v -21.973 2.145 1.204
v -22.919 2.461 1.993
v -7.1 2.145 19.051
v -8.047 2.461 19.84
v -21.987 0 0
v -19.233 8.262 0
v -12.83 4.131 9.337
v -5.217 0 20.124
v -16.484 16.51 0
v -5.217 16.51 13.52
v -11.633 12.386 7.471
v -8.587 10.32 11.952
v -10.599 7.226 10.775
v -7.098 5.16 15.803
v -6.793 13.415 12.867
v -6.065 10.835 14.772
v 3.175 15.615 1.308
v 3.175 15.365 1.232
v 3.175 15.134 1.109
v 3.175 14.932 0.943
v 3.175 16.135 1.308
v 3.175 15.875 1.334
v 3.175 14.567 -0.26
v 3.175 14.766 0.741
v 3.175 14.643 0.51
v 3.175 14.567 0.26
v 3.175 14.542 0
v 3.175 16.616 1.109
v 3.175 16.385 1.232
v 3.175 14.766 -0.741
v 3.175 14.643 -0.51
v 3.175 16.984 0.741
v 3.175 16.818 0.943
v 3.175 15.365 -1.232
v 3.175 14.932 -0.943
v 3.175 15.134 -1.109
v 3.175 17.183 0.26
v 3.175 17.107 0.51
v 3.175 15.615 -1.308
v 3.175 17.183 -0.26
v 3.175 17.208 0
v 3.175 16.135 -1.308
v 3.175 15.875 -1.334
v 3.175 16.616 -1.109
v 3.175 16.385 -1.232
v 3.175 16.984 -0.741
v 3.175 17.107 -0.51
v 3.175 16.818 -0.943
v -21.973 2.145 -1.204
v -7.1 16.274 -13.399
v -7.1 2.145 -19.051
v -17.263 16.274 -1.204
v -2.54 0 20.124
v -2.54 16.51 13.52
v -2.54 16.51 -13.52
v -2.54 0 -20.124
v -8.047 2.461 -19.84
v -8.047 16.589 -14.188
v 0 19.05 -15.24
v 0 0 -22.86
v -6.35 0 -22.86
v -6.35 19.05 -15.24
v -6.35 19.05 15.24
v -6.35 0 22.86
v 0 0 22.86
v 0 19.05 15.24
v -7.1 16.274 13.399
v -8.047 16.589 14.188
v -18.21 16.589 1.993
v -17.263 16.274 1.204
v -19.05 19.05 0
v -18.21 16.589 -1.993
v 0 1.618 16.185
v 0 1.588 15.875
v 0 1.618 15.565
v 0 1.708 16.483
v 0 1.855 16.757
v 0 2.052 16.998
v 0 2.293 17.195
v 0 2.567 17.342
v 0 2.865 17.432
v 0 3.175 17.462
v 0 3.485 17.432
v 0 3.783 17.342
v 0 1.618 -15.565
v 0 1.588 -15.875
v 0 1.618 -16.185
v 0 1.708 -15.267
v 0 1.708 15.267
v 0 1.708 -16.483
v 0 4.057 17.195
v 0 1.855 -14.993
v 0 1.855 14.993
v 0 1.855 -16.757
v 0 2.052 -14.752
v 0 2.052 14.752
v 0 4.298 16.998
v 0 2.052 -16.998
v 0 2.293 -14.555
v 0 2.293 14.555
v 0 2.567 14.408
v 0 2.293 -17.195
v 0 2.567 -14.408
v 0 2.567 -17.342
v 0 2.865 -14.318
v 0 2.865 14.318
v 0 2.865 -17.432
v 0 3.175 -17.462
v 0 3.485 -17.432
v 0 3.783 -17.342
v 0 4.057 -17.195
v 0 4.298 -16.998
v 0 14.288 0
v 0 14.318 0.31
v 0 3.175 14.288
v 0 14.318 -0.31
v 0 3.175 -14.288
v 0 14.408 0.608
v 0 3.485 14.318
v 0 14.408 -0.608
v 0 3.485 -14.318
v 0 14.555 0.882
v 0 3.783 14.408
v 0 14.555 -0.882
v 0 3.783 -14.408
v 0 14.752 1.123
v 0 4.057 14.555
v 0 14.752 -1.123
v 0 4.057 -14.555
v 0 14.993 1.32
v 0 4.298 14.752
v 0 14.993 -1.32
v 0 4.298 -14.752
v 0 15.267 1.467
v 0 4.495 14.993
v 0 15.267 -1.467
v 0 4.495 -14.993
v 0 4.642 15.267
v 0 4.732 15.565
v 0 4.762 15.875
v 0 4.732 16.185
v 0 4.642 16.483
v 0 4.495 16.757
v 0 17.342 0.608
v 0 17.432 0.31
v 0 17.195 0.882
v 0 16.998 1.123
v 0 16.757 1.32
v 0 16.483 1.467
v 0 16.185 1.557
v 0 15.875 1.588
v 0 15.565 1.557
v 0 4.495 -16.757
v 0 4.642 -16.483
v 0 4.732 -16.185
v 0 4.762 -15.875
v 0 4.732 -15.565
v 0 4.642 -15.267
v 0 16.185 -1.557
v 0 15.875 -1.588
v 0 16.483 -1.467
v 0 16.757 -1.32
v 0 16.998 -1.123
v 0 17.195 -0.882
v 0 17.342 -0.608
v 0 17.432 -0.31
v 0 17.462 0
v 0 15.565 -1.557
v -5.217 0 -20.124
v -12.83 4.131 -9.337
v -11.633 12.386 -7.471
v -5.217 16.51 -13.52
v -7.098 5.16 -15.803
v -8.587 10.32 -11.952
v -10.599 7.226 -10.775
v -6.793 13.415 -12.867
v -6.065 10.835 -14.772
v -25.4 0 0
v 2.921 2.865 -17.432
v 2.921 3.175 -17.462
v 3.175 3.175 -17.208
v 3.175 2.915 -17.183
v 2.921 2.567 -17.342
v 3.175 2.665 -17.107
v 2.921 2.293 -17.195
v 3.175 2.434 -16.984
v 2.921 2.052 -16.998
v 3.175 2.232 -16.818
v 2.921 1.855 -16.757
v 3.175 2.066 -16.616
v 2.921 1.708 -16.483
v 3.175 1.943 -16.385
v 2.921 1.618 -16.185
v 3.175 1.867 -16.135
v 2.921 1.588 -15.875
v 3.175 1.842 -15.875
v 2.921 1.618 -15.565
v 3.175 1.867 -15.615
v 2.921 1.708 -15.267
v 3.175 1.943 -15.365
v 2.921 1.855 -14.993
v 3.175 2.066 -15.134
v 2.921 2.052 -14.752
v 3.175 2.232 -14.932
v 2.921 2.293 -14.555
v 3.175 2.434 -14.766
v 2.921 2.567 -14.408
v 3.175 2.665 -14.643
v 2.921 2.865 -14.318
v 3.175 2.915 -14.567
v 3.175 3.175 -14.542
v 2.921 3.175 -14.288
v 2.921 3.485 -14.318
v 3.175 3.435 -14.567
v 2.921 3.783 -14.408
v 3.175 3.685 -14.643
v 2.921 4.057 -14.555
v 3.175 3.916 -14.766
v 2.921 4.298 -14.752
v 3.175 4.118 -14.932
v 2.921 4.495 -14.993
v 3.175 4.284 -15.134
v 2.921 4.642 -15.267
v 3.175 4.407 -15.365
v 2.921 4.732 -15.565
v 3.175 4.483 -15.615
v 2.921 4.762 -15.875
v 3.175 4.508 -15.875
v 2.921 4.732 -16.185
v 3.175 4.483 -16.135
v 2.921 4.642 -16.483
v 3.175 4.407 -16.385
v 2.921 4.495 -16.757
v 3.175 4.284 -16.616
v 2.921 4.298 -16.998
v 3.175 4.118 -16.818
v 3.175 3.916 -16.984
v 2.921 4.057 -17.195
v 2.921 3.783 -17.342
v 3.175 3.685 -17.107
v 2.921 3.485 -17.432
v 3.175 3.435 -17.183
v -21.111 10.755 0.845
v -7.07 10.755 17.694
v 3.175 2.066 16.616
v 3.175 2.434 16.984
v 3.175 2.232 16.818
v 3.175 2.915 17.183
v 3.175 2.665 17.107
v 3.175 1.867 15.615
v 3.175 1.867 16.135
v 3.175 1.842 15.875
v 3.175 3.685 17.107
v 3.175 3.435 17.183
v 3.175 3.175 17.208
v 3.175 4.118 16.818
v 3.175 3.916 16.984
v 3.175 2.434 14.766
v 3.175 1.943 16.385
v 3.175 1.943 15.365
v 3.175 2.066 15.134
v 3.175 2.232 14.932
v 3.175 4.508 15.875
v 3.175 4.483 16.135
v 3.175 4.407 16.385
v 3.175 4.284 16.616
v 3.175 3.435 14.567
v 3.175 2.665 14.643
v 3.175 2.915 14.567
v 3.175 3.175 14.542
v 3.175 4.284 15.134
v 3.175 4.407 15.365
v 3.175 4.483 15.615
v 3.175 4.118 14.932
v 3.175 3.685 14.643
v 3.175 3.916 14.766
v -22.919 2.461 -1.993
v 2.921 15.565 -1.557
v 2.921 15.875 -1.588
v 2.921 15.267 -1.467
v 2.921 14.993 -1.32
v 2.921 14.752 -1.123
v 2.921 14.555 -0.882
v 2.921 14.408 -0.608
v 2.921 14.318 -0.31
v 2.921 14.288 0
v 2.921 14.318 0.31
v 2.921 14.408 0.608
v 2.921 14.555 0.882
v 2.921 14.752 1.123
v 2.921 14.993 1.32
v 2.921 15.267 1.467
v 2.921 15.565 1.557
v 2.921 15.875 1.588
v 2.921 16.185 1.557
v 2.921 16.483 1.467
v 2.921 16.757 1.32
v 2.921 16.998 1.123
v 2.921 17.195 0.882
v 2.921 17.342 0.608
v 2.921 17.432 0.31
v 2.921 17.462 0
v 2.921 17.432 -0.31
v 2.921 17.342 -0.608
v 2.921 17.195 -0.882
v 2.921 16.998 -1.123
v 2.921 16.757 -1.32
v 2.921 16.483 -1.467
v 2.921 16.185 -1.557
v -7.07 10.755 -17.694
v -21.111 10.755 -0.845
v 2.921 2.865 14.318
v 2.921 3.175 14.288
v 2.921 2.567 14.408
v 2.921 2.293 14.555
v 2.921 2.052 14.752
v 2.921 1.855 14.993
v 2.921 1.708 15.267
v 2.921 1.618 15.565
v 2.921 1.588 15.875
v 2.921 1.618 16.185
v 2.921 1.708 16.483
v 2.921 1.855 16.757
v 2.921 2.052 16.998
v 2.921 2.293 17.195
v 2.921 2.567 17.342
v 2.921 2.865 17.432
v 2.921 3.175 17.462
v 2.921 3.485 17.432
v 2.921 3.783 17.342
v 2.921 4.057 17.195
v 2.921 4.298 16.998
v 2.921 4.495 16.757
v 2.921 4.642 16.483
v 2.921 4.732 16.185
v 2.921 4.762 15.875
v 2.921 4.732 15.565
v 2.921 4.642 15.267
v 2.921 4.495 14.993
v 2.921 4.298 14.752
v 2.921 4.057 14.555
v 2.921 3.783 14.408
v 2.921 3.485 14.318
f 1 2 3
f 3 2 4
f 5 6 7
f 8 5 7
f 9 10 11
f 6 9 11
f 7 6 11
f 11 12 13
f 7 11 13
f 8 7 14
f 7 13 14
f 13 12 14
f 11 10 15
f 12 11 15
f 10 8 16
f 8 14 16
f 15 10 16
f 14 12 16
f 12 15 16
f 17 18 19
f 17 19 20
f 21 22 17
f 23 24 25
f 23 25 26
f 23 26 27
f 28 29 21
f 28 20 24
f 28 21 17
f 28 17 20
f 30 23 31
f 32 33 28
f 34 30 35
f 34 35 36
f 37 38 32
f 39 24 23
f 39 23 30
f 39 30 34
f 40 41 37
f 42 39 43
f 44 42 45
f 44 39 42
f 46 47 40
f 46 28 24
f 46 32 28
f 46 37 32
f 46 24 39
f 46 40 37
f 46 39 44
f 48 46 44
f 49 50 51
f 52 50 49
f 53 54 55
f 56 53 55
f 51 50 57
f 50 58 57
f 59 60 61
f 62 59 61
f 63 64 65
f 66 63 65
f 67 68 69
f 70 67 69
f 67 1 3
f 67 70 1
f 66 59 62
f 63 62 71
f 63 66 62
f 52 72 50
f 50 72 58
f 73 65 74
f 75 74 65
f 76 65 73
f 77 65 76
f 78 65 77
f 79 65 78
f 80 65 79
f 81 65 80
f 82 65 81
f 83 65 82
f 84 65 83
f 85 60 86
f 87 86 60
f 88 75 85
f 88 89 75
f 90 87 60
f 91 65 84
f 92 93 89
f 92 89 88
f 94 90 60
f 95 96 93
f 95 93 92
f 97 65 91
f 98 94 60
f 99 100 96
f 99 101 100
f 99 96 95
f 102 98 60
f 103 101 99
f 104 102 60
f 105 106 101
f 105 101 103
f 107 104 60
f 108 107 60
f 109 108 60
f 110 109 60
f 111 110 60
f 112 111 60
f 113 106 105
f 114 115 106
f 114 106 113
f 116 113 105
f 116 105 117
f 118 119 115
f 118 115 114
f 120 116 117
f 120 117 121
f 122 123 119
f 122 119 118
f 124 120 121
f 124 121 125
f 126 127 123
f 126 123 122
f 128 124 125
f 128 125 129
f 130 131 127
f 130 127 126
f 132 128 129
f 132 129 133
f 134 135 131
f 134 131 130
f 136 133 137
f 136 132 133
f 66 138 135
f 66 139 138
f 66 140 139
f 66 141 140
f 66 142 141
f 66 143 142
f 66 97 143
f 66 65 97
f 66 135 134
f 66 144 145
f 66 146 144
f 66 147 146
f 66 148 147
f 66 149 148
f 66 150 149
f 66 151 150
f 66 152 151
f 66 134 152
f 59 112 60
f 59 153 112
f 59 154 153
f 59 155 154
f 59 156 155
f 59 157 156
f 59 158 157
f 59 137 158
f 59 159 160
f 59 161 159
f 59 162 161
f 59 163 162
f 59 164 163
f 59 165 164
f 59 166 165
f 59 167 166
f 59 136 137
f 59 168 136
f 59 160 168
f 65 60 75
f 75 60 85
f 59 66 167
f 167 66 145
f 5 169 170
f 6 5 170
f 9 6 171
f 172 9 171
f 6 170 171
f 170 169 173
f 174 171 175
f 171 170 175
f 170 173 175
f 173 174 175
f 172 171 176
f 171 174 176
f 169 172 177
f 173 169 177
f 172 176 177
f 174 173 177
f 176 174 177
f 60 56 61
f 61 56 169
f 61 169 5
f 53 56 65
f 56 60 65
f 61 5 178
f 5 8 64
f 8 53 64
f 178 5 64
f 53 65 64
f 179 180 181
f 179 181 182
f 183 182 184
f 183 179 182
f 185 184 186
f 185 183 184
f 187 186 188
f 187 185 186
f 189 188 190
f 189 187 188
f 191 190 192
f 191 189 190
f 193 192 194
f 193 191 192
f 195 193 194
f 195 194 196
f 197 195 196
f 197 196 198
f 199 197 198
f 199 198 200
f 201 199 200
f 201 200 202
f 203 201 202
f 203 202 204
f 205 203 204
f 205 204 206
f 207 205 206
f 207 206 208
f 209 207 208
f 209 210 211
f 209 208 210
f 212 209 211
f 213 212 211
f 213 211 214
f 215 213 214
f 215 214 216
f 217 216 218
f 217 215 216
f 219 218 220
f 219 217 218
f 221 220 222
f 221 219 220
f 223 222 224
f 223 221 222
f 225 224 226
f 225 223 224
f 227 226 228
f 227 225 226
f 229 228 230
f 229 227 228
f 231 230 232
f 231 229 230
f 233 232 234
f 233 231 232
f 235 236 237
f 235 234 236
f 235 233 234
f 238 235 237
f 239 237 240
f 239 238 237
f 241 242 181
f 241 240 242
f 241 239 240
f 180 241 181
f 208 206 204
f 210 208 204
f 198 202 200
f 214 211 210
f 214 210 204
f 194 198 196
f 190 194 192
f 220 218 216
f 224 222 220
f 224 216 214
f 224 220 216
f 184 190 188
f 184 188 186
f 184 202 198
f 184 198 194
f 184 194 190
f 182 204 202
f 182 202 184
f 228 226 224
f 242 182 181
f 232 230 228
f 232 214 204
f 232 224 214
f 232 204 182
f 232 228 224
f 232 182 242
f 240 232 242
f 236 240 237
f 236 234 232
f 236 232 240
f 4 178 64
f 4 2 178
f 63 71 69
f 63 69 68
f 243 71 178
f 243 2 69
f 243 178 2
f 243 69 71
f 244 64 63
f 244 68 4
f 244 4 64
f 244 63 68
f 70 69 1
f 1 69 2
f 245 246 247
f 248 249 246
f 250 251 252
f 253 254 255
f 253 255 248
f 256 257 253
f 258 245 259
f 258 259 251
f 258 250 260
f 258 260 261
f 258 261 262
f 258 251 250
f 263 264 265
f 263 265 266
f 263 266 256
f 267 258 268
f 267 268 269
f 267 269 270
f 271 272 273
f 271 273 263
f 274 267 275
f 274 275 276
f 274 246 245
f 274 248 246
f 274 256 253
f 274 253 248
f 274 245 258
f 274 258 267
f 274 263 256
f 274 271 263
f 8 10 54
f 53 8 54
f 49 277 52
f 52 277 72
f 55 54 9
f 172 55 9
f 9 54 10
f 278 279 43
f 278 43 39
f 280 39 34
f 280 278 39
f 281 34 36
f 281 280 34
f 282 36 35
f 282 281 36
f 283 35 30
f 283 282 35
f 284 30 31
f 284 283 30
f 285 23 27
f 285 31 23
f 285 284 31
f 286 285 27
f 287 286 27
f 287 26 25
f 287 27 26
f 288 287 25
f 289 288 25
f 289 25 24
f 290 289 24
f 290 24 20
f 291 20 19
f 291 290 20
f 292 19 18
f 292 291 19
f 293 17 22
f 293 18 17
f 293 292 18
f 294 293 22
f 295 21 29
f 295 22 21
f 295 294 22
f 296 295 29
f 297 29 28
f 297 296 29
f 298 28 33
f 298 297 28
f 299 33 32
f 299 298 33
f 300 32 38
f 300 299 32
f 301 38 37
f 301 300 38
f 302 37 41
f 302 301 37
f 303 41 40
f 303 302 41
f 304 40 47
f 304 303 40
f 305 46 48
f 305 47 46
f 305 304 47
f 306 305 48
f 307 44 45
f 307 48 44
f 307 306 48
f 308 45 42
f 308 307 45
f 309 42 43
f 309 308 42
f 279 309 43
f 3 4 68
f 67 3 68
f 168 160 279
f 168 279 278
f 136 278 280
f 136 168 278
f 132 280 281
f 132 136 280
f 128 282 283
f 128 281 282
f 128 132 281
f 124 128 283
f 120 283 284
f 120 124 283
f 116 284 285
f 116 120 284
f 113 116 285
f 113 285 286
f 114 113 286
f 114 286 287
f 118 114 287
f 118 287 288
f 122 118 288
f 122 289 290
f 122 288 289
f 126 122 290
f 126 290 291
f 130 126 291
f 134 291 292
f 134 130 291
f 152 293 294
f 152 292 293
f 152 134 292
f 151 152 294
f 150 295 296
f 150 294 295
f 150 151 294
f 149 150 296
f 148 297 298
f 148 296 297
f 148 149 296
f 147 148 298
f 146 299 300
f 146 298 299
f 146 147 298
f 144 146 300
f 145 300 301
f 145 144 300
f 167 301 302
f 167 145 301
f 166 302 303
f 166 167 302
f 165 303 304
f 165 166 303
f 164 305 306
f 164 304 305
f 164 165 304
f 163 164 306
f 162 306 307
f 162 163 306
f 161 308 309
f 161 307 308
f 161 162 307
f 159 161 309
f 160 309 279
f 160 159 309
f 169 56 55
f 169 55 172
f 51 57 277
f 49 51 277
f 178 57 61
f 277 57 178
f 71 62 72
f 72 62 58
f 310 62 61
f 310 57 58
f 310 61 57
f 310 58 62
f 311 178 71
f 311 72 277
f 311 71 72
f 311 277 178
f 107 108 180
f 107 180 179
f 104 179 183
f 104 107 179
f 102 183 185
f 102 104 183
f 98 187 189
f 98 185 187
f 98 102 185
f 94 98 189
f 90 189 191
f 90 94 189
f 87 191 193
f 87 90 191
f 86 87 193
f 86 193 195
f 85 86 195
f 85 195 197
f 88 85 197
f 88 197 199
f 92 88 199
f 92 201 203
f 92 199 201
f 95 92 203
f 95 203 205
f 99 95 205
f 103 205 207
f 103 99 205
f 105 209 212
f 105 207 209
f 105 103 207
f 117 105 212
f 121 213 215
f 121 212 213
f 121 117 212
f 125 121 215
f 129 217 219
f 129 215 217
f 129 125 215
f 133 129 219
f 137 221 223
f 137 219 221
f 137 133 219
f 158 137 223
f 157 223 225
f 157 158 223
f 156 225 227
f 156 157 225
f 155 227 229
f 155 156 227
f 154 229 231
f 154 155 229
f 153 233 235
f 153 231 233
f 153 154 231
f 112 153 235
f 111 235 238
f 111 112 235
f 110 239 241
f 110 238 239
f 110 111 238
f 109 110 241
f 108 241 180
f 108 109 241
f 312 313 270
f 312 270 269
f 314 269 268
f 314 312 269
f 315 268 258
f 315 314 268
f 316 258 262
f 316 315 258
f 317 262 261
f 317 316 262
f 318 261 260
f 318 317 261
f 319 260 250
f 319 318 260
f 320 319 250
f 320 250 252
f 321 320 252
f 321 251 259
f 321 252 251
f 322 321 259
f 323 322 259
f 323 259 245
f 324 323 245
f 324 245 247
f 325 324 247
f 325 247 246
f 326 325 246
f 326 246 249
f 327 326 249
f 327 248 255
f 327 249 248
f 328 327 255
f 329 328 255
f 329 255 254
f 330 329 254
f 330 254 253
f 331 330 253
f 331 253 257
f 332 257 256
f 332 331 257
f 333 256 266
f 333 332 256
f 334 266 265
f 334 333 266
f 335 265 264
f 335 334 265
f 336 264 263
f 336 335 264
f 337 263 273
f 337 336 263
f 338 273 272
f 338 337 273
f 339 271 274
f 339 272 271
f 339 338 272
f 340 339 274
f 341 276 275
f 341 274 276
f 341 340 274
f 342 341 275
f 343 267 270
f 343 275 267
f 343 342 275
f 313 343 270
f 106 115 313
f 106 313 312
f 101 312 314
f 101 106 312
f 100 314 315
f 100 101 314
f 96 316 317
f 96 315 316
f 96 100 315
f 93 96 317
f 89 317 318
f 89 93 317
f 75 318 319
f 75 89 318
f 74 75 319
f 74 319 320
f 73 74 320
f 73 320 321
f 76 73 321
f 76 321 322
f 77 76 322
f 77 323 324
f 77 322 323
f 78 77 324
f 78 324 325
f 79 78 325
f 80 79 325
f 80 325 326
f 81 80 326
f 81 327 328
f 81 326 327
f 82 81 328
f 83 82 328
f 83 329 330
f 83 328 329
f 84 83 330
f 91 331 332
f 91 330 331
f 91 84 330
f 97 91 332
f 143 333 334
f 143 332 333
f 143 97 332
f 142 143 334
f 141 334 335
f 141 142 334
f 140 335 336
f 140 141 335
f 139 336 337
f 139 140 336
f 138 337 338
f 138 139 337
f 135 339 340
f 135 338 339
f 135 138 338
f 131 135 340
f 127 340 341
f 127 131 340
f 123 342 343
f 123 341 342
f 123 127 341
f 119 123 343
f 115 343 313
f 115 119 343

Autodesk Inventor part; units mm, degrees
ref_plane "YZ Plane" through (0, 0, 0) normal (1, 0, 0) x (0, 1, 0)
ref_plane "XY Plane" through (0, 0, 0) normal (0, 0, 1) x (1, 0, 0)
sketch "Bottom sketch" plane through (0, 0, 0) normal (0, 1, 0) x (-1, 0, 0)
  line L0 (0, 0) -> (0, -22.86)
  line L1 (0, -22.86) -> (6.35, -22.86)
  line L2 (6.35, -22.86) -> (25.4, -22.86) construction
  line L3 (25.4, -22.86) -> (25.4, 0) construction
  line L4 (6.35, -22.86) -> (25.4, 0)
  line L5 (25.4, 0) -> (0, 0) construction
  line L6 (0, 0) -> (0, 22.86)
  line L7 (0, 22.86) -> (6.35, 22.86)
  line L8 (6.35, 22.86) -> (25.4, 0)
  dimension "d0" = 22.86
  dimension "d1" = 6.35
  dimension "d2" = 19.05
  dimension "d3" = 25.4
ref_plane "Work Plane1" through (0, 19.05, 0) normal (0, 1, 0) x (-1, 0, 0)
sketch "Top sketch" plane through (0, 19.05, 0) normal (0, 1, 0) x (-1, 0, 0)
  line L0 (0, 0) -> (0, -15.24)
  line L1 (0, -15.24) -> (6.35, -15.24)
  line L2 (6.35, -15.24) -> (19.05, -15.24) construction
  line L3 (19.05, -15.24) -> (19.05, 0) construction
  line L4 (19.05, 0) -> (0, 0) construction
  line L5 (19.05, 0) -> (6.35, -15.24)
  line L6 (0, 0) -> (0, 15.24)
  line L7 (0, 15.24) -> (6.35, 15.24)
  line L8 (19.05, 0) -> (6.35, 15.24)
  dimension "d5" = 15.24
  dimension "d6" = 6.35
  dimension "d7" = 12.7
loft "Loft1" add profiles "Bottom sketch", "Top sketch"
shell "Cow catcher shell" thickness 2.54 removed faces 1 at (-10.5833, 0, 7.62)
sketch "Cut out sketch" plane through (-25.4, 0, 0) normal (-0.7442084, 0.2480695, 0.6201737) x (0.6401844, 0, 0.7682213)
  line L0 (6.1338, 17.1247) -> (3.1188, 2.54)
  line L1 (3.1188, 2.54) -> (26.3508, 2.54)
  line L2 (26.3508, 2.54) -> (22.0092, 17.1247)
  line L3 (22.0092, 17.1247) -> (6.1338, 17.1247)
  line L4 (0, 0) -> (29.7571, 0) projected
  line L5 (29.7571, 0) -> (23.9032, 19.6647) projected
  line L6 (4.0652, 19.6647) -> (23.9032, 19.6647) projected
  line L7 (0, 0) -> (4.0652, 19.6647) projected
  line L8 (29.7571, 0) -> (23.9032, 19.6647) projected
  dimension "d13" = 2.54
  dimension "d14" = 2.54
  dimension "d15" = 2.54
  dimension "d16" = 2.54
extrude "Cut out extrution" cut sketch "Cut out sketch" against normal blind 1.27 contours L3 L2 L1 L0
ref_plane "Work Plane2" through (-6.35, 57.15, 0) normal (0, 0, 1) x (1, 0, 0)
mirror "Cut out mirror" about plane through (-6.35, 57.15, 0) normal (0, 0, 1) of "Cut out extrution"
sketch "Back peg sketch" plane through (0, 0, 22.86) normal (1, 0, 0) x (0, 0, -1)
  circle A0 centre (6.985, 3.175) radius 1.5875
  circle A1 centre (22.86, 15.875) radius 1.5875
  line L0 (0, 0) -> (45.72, 0) projected
  line L1 (22.86, 0) -> (22.86, 19.05) construction
  line L2 (22.86, 19.05) -> (22.86, 0) construction
  circle A2 centre (38.735, 3.175) radius 1.5875
  dimension "d19" = 3.175
  dimension "d20" = 3.175
  dimension "d21" = 3.175
  dimension "d22" = 6.985
  dimension "d23" = 15.875
  dimension "d24" = 45.72
  dimension "d25" = 22.86
extrude "Back peg extrution" add sketch "Back peg sketch" along normal blind 3.175
chamfer "Peg chamfer" distance 0.254 angle 45 3 edges at (3.175, 15.875, 1.5875) (3.175, 3.175, 17.4625) (3.175, 3.175, -14.2875)
properties part number "Caufield_Cow_Catcher"
